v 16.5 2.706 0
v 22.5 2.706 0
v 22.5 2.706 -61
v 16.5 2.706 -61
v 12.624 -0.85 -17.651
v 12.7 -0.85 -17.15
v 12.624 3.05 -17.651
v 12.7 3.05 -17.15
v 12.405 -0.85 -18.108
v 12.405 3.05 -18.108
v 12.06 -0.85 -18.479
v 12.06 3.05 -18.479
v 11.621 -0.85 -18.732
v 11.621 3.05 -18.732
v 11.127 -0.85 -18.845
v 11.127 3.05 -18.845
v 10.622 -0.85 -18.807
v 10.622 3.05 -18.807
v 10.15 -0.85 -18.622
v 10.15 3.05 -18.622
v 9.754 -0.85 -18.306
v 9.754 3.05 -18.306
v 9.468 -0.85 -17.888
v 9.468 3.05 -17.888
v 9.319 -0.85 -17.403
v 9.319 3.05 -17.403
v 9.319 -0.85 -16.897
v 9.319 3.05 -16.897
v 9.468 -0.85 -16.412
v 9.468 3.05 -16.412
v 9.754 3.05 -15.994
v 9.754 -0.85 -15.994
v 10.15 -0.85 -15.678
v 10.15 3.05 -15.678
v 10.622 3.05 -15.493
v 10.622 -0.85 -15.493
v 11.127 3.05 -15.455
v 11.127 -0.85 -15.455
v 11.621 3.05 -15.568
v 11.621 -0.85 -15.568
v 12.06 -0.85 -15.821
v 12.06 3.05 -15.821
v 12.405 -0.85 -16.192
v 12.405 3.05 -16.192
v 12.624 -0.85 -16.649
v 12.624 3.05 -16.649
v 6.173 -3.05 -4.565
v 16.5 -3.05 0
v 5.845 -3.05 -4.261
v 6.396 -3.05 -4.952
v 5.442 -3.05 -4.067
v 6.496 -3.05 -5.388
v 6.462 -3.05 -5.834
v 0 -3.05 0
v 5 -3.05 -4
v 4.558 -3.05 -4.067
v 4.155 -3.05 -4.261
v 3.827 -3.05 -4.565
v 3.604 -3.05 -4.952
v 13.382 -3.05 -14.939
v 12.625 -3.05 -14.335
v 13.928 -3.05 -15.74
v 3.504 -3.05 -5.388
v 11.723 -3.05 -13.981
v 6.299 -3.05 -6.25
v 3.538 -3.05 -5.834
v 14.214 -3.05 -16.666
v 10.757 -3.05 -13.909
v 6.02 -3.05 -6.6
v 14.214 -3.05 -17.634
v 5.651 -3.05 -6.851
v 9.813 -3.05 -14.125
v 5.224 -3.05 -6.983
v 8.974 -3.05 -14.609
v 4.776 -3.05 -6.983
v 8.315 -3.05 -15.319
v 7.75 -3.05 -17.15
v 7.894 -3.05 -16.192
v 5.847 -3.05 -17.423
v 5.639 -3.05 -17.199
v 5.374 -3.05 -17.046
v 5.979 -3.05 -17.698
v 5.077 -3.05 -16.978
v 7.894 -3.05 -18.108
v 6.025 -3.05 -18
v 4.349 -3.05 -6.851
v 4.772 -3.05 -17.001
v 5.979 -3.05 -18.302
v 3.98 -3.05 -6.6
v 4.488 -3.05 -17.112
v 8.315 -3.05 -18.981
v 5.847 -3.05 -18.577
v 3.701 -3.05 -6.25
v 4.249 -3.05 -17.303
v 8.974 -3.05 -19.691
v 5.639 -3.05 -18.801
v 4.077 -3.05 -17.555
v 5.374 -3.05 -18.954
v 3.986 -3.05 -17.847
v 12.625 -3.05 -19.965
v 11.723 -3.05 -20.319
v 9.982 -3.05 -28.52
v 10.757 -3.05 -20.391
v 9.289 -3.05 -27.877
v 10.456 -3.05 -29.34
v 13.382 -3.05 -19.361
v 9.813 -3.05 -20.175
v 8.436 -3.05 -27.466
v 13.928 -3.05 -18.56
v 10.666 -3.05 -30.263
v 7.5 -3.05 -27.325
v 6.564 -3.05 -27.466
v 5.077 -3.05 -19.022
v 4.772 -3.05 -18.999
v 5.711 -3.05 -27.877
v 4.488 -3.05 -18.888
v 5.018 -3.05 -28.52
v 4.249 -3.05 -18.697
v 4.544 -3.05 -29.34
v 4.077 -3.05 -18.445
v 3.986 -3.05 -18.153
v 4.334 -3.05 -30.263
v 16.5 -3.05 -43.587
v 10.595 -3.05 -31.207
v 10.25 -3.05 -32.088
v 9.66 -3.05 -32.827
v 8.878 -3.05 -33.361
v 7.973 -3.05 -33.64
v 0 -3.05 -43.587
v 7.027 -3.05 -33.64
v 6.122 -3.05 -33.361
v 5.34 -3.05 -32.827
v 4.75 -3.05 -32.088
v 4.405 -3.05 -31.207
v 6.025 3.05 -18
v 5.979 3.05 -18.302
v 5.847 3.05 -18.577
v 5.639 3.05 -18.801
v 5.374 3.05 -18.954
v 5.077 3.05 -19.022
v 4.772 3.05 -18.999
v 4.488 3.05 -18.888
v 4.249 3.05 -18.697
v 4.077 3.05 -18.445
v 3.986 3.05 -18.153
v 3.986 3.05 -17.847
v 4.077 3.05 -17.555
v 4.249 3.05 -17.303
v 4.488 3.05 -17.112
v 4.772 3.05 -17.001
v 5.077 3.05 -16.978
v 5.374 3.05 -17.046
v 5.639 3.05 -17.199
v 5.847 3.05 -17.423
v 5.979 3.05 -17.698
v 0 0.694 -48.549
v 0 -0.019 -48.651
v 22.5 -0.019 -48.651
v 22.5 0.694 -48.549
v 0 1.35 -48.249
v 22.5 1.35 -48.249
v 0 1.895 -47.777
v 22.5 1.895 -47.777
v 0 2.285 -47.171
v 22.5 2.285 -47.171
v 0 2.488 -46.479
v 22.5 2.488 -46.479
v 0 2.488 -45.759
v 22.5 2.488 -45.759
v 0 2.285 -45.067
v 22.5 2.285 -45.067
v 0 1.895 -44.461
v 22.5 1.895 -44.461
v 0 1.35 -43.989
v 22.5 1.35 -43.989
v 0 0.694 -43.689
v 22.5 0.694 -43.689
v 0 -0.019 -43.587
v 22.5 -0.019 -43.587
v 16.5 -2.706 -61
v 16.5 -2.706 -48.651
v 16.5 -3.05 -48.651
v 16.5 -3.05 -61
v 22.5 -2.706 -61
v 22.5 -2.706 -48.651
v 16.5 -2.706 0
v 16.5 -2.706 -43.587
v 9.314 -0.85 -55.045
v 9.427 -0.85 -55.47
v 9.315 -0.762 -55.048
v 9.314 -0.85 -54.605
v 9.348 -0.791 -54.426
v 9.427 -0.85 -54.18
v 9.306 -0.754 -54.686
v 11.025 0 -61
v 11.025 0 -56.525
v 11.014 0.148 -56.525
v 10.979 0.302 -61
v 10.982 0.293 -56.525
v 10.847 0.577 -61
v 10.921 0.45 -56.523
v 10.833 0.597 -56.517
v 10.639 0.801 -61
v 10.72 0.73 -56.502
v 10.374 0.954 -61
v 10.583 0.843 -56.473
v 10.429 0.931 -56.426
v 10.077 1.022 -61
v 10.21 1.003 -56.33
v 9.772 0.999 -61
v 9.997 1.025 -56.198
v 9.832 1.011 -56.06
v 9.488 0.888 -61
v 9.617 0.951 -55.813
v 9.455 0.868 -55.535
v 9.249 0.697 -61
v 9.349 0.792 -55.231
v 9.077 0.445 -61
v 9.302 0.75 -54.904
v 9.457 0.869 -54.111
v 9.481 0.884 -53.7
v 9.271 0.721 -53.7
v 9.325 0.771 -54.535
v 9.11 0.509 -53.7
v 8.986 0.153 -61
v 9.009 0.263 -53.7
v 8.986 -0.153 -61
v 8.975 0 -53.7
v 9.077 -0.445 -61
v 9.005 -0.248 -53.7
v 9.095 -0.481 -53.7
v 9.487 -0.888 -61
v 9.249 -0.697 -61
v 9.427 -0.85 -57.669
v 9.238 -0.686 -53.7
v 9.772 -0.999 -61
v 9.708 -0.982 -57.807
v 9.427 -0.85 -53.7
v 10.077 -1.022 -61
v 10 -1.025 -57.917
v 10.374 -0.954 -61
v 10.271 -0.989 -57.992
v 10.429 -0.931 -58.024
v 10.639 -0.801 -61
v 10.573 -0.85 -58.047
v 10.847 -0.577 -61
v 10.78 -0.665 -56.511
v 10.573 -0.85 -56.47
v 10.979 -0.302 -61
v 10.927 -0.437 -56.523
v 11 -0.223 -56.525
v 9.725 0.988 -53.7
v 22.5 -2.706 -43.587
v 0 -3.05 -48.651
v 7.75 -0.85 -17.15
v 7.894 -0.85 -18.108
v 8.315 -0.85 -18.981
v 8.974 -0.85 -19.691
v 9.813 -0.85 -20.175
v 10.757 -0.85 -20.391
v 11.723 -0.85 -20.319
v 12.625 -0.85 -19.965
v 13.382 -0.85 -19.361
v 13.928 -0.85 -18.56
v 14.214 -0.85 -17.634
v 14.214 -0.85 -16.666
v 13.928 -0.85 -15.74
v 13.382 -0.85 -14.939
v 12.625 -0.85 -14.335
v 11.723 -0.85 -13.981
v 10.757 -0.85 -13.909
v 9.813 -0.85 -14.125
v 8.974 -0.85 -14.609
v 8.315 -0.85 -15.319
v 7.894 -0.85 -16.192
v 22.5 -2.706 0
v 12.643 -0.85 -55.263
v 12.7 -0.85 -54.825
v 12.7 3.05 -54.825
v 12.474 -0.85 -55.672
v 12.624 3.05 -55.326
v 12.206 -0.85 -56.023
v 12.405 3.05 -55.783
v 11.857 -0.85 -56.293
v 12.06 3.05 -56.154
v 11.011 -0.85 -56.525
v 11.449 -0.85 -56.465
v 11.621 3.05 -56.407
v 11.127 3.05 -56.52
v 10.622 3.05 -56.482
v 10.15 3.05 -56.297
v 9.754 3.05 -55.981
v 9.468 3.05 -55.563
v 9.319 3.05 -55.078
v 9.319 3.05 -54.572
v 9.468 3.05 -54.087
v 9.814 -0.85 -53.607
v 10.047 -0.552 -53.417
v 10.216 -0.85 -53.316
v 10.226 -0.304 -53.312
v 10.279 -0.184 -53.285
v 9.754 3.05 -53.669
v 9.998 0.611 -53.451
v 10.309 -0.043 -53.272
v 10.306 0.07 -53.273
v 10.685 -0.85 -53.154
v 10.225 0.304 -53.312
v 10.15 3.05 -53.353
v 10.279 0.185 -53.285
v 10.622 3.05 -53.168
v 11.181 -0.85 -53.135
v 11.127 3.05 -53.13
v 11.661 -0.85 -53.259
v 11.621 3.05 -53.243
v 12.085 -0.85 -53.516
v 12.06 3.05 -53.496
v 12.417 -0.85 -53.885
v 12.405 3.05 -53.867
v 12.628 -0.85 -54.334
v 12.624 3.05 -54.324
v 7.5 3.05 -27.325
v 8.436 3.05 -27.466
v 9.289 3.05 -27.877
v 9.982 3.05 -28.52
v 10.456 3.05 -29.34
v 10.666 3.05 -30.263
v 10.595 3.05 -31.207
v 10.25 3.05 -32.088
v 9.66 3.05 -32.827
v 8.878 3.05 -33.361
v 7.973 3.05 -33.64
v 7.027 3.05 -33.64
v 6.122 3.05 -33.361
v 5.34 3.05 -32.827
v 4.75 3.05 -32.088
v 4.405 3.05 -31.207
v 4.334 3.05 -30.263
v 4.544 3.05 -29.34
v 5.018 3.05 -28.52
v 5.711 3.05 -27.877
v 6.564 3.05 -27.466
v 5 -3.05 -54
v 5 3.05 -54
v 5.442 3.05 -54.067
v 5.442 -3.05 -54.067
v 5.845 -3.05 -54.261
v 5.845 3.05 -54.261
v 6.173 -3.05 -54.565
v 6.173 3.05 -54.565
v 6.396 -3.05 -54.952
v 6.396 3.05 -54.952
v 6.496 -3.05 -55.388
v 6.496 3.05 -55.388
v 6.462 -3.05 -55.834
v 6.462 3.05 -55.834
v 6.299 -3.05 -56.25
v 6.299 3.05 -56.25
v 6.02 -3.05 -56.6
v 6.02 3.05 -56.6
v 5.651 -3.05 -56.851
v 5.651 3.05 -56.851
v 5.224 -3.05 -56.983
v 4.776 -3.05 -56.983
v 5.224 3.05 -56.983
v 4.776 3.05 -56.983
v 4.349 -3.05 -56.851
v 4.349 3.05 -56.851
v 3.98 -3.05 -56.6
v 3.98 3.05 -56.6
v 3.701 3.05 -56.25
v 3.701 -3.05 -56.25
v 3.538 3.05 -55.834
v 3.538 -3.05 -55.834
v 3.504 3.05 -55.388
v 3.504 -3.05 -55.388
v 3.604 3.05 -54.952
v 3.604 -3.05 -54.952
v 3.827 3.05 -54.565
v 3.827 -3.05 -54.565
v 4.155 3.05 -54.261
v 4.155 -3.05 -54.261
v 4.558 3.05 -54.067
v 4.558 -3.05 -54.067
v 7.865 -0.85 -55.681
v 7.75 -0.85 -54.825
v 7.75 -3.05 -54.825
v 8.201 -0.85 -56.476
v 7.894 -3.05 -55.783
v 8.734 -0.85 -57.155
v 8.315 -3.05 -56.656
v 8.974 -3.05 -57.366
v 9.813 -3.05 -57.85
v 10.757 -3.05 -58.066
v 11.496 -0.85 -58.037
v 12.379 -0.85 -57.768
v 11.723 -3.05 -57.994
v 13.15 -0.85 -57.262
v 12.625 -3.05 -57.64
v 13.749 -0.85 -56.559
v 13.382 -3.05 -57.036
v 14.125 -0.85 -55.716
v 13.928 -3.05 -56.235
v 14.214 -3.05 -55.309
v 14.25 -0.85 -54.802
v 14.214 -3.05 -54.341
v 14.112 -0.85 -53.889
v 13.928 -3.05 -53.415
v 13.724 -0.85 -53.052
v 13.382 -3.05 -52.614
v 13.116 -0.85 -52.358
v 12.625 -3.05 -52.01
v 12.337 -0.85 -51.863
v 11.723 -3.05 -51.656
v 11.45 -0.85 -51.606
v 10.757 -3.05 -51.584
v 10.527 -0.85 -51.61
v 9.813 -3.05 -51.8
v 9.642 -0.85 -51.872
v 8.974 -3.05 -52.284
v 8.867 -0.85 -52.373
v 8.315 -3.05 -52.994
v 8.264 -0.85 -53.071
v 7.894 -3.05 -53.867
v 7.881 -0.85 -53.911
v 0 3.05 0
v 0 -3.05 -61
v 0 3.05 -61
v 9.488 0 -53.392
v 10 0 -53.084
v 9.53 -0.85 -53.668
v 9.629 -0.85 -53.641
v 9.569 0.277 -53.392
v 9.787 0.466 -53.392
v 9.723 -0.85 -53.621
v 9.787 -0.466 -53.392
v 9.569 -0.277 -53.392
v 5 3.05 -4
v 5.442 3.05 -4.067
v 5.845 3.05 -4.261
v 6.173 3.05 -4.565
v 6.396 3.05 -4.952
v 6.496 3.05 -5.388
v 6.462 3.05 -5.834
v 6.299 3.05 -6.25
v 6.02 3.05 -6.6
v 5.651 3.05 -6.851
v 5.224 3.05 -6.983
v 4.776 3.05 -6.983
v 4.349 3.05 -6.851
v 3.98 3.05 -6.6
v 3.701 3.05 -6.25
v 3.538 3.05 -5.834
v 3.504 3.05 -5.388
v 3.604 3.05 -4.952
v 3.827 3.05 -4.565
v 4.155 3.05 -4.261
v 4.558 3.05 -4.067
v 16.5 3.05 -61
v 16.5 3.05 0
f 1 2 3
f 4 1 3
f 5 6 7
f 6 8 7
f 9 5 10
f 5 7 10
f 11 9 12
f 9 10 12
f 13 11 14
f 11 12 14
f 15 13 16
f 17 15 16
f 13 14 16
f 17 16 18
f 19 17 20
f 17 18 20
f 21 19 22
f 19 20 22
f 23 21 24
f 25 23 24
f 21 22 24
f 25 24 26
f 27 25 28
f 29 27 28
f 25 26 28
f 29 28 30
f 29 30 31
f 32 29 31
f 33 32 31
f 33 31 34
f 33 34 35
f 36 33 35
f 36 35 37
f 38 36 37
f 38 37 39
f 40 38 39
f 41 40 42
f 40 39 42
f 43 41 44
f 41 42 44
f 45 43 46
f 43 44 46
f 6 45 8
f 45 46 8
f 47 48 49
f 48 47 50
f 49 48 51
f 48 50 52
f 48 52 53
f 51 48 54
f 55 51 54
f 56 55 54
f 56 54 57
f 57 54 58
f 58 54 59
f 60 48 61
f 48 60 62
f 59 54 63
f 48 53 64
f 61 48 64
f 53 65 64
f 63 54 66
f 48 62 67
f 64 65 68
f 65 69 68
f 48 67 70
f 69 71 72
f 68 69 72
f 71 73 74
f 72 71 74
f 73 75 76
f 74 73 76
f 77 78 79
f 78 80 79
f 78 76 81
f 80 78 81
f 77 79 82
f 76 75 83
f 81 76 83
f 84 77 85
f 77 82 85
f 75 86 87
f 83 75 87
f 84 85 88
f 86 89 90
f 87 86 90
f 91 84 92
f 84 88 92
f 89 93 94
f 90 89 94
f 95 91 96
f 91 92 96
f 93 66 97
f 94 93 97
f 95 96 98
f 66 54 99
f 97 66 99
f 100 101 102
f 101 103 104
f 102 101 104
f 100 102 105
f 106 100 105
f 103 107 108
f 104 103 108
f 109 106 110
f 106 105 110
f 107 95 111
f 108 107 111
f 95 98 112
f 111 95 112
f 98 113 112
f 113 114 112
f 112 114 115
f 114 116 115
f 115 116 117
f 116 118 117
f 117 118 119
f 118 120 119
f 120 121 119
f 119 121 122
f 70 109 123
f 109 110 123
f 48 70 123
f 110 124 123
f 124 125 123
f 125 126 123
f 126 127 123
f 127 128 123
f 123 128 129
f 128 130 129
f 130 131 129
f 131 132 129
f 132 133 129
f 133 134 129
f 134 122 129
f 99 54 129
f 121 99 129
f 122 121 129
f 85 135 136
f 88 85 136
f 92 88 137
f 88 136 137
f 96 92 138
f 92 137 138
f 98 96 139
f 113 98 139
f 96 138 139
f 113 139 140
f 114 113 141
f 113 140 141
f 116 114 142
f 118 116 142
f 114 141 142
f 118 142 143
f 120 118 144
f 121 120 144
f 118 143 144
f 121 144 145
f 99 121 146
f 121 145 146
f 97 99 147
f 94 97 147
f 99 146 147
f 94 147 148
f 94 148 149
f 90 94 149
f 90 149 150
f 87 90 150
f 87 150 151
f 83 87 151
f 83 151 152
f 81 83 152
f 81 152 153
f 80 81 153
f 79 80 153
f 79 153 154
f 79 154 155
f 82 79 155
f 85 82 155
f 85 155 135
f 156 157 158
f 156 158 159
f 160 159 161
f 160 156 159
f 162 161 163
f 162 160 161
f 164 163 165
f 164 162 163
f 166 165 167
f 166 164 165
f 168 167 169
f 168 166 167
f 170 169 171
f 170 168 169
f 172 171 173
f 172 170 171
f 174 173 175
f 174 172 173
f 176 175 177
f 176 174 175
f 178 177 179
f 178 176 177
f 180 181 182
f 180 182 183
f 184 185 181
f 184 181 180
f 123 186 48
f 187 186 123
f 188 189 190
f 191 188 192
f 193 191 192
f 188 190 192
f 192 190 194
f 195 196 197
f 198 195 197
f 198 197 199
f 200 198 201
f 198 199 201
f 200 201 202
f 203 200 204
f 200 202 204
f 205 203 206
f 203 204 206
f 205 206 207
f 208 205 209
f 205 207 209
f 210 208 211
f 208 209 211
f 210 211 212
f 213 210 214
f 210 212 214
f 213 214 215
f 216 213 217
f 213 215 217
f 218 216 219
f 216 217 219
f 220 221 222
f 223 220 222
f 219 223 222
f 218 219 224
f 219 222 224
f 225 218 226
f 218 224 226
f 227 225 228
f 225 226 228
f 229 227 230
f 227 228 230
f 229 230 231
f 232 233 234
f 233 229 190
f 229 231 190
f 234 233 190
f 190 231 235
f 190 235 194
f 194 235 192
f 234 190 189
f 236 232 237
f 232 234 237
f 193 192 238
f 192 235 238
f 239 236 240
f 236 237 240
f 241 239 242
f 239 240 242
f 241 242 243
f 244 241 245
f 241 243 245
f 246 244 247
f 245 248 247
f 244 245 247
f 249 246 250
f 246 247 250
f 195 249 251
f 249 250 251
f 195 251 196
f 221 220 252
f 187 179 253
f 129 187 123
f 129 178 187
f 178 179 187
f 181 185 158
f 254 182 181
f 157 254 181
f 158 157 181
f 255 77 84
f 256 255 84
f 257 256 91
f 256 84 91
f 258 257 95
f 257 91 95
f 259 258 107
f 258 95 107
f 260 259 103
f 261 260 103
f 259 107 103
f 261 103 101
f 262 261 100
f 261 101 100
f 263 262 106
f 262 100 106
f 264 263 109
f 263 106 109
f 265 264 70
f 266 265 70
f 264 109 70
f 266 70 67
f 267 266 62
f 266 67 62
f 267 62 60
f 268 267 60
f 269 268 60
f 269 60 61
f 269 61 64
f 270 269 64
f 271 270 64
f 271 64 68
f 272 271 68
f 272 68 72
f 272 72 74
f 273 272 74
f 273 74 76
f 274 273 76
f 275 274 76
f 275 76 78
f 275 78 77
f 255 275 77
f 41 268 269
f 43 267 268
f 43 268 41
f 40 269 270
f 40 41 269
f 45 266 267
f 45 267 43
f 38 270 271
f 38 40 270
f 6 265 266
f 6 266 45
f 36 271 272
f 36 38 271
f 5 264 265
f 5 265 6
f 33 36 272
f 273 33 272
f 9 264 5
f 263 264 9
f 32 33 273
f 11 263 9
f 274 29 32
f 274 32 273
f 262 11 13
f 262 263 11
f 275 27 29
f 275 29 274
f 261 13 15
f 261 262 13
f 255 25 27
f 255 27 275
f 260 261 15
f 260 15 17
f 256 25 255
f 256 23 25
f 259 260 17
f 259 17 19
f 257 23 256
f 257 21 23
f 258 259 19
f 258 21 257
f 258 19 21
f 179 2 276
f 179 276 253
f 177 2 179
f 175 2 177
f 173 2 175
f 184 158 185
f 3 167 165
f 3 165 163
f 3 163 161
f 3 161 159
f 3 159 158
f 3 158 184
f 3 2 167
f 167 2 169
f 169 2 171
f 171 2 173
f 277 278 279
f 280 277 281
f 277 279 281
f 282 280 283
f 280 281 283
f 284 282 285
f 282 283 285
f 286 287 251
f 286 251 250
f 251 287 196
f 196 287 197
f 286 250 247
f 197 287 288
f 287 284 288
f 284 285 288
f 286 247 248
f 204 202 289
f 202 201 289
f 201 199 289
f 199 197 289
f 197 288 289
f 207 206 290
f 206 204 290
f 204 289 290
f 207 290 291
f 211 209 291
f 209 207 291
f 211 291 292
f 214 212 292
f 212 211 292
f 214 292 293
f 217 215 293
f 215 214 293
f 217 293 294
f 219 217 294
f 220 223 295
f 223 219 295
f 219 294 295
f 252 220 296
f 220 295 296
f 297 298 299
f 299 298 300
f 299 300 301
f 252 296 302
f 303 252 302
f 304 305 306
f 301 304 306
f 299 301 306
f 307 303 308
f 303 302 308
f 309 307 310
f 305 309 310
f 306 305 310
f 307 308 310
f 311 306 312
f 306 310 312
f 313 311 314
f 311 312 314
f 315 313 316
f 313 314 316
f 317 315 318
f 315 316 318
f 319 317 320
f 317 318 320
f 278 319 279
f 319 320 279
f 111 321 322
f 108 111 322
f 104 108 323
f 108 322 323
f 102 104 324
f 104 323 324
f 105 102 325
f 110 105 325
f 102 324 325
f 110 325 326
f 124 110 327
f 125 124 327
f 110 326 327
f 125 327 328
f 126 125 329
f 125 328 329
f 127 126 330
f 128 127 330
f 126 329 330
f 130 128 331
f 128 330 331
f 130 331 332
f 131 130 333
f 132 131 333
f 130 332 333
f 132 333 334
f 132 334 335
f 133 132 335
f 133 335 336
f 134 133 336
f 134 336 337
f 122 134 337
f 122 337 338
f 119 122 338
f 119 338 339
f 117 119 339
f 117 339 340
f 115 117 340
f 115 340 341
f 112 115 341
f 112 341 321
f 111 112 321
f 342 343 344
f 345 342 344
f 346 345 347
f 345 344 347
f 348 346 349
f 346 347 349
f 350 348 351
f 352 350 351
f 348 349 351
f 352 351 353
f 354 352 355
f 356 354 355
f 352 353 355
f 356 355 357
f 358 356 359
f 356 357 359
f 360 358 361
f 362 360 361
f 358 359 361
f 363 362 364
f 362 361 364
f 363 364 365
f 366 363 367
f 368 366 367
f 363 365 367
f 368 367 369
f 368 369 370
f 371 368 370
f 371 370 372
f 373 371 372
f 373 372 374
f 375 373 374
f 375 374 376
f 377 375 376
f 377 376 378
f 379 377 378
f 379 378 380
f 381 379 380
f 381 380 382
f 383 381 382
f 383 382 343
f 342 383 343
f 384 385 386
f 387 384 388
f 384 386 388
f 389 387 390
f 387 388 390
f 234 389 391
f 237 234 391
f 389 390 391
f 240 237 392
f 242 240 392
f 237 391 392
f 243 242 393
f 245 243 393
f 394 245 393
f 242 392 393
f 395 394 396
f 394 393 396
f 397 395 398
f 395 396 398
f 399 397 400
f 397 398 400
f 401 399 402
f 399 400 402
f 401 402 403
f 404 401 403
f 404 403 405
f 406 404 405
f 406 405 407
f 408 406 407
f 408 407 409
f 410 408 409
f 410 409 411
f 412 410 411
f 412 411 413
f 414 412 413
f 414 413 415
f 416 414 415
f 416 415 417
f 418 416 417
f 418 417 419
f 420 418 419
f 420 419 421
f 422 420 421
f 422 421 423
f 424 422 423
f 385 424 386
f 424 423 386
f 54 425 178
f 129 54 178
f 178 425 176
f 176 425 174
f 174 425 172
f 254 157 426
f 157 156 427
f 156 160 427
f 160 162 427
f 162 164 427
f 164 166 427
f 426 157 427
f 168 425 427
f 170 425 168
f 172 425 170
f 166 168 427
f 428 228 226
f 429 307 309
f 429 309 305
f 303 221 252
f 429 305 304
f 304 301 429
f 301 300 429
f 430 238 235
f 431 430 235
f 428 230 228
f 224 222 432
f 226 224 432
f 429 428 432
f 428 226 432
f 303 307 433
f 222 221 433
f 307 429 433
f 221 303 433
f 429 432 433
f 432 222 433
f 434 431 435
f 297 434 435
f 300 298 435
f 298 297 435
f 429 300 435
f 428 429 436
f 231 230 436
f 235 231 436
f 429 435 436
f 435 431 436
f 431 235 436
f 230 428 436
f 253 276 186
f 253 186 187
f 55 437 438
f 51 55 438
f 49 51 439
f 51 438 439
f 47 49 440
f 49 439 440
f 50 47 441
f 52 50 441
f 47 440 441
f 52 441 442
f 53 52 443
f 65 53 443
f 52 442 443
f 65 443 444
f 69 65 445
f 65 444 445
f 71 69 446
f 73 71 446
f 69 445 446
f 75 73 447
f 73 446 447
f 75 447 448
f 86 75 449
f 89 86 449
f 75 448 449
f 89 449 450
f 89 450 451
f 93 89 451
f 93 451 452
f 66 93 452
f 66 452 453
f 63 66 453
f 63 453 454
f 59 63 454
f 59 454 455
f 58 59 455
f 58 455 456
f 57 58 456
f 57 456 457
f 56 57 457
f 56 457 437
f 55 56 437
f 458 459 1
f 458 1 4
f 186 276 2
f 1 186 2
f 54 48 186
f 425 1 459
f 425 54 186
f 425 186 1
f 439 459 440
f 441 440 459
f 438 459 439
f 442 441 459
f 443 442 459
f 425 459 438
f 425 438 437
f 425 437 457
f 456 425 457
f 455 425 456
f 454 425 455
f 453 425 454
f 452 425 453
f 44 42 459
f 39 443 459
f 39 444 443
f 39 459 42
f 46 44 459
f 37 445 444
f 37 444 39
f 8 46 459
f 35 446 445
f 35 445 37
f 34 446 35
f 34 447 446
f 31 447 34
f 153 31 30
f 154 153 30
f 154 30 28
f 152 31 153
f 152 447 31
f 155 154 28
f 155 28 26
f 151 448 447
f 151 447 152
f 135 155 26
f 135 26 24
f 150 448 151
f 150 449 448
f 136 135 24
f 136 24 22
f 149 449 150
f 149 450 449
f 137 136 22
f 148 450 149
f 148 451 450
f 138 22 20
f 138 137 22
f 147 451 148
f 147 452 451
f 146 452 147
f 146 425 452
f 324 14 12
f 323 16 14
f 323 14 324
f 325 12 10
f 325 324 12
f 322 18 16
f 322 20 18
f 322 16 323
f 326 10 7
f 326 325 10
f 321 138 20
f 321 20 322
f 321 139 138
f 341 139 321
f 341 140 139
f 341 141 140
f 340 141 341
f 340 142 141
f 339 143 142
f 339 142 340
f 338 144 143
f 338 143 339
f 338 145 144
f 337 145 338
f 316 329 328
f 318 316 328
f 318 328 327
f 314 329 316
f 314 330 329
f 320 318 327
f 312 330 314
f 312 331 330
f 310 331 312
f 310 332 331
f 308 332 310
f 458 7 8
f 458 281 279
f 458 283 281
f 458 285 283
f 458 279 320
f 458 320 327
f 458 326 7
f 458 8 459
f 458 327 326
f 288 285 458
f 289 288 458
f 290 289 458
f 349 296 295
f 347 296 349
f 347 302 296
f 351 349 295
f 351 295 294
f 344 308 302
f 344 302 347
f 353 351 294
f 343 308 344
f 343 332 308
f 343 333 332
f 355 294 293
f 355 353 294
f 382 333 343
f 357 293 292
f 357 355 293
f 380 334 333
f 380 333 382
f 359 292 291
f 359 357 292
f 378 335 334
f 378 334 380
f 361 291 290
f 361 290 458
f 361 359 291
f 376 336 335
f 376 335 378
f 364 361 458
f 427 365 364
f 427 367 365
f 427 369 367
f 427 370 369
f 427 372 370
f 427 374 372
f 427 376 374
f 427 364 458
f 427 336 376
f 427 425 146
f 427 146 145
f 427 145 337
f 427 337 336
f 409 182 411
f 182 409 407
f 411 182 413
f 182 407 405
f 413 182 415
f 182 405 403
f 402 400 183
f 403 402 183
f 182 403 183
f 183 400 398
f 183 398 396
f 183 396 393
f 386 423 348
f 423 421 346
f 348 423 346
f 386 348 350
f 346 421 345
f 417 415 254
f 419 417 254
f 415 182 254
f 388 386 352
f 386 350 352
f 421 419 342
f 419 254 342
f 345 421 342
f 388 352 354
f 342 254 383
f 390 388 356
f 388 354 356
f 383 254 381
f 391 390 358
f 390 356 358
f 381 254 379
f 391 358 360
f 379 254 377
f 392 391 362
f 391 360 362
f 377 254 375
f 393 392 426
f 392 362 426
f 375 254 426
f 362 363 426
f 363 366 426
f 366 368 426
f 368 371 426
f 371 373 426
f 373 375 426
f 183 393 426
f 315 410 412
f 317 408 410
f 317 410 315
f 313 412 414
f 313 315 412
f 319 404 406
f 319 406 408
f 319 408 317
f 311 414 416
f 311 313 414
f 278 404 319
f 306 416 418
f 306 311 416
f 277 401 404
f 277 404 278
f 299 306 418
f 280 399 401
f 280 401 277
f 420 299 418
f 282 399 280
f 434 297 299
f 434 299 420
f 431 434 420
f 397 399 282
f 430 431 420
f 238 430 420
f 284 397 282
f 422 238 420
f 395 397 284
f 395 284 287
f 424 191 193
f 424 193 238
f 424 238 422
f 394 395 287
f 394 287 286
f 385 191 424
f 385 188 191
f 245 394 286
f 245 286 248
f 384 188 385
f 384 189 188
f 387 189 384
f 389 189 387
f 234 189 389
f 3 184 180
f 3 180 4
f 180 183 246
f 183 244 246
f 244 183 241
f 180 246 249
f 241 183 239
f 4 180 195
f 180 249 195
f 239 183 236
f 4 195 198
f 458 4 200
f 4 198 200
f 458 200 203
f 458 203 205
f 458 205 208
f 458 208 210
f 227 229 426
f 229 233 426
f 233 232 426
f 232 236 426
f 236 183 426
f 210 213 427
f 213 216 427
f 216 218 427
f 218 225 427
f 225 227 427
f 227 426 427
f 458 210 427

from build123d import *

# Parameters (mm, degrees)
SKETCH1_W                                        = 61
SKETCH1_H                                        = 6.1
BOSS_EXTRUDE1_DEPTH                              = 22.5
SKETCH2_OUTSIDE_W                                = 76.06
SKETCH2_OUTSIDE_H                                = 21.16
SKETCH2_OUTSIDE_W_2                              = 61
SKETCH2_OUTSIDE_H_2                              = 5.41284
CUT_EXTRUDE1_DEPTH                               = 6
CUT_EXTRUDE3_DEPTH                               = 23.5
SKETCH6_R                                        = 3.175
CUT_EXTRUDE4_DEPTH                               = 7.1
SKETCH7_R                                        = 1.5
CUT_EXTRUDE5_DEPTH                               = 7.1
M2_5X0_45_TAPPED_HOLE1_D                         = 2.05
M2_5X0_45_TAPPED_HOLE2_D                         = 2.05
M2_5X0_45_TAPPED_HOLE2_DEPTH                     = 7.3
M2_5X0_45_TAPPED_HOLE2_TIP                       = 0.615882135
CBORE_FOR_M3_PAN_HEAD_MACHINE_SCREW1_D           = 3.4
CBORE_FOR_M3_PAN_HEAD_MACHINE_SCREW1_CBORE_D     = 6.5
CBORE_FOR_M3_PAN_HEAD_MACHINE_SCREW1_CBORE_DEPTH = 2.2


with BuildPart() as part:
    # Sketch1 → Boss-Extrude1 (new body)
    with BuildSketch(Plane(origin=(0, 0, 0), x_dir=(0, 0, -1), z_dir=(1, 0, 0))):
        with Locations((30.5, 0)):
            Rectangle(SKETCH1_W, SKETCH1_H)
    extrude(amount=BOSS_EXTRUDE1_DEPTH)

    # Sketch2 outside → Cut-Extrude1 (cut)
    with BuildSketch(Plane(origin=(22.5, 0, 0), x_dir=(0, 0, -1), z_dir=(1, 0, 0))):
        with Locations((30.5, 0)):
            Rectangle(SKETCH2_OUTSIDE_W, SKETCH2_OUTSIDE_H)
        with Locations((30.5, 0)):
            Rectangle(SKETCH2_OUTSIDE_W_2, SKETCH2_OUTSIDE_H_2, mode=Mode.SUBTRACT)
    extrude(amount=-CUT_EXTRUDE1_DEPTH, mode=Mode.SUBTRACT)

    # Sketch5 → Cut-Extrude3 (cut, through all)
    with BuildSketch(Plane.ZY):
        with BuildLine():
            Line((-43.5866, -0.01898), (-43.5866, -3.05))
            Line((-43.5866, -3.05), (-48.6514, -3.05))
            Line((-48.6514, -3.05), (-48.6514, -0.01898))
            ThreePointArc((-48.6514, -0.01898), (-46.119, 2.51342), (-43.5866, -0.01898))
        make_face()
    extrude(amount=-CUT_EXTRUDE3_DEPTH, mode=Mode.SUBTRACT)

    # Sketch6 → Cut-Extrude4 (cut, through all)
    with BuildSketch(Plane(origin=(0, 3.05, 0), x_dir=(1, 0, 0), z_dir=(0, 1, 0))):
        with Locations(Location((7.5, 30.5, 0), (0, 0, 270))):  # turned: the seam where the file's is
            Circle(SKETCH6_R)
    extrude(amount=-CUT_EXTRUDE4_DEPTH, mode=Mode.SUBTRACT)

    # Sketch7 → Cut-Extrude5 (cut, through all)
    with BuildSketch(Plane(origin=(0, 3.05, 0), x_dir=(1, 0, 0), z_dir=(0, 1, 0))):
        with Locations(Location((5, 55.5, 0), (0, 0, 270))):  # turned: the seam where the file's is
            Circle(SKETCH7_R)
        with Locations(Location((5, 5.5, 0), (0, 0, 270))):  # turned: the seam where the file's is
            Circle(SKETCH7_R)
    extrude(amount=-CUT_EXTRUDE5_DEPTH, mode=Mode.SUBTRACT)

    # M2.5x0.45 Tapped Hole1 (through all)
    with Locations(Plane(origin=(0, -3.05, 0), x_dir=(-1, 0, 0), z_dir=(0, -1, 0))):
        with Locations((-5, 18)):
            Hole(M2_5X0_45_TAPPED_HOLE1_D / 2)

    # M2.5x0.45 Tapped Hole2
    with Locations(Plane(origin=(0, 0, -61), x_dir=(-1, 0, 0), z_dir=(0, 0, -1))):
        with Locations((-10, 0)):
            Hole(M2_5X0_45_TAPPED_HOLE2_D / 2, depth=M2_5X0_45_TAPPED_HOLE2_DEPTH)
            with Locations((0, 0, -(M2_5X0_45_TAPPED_HOLE2_DEPTH + M2_5X0_45_TAPPED_HOLE2_TIP / 2))):  # 118° drill point
                Cone(0, M2_5X0_45_TAPPED_HOLE2_D / 2, M2_5X0_45_TAPPED_HOLE2_TIP, mode=Mode.SUBTRACT)

    # CBORE for M3 Pan Head Machine Screw1 (through all)
    with Locations(Plane(origin=(0, -3.05, 0), x_dir=(-1, 0, 0), z_dir=(0, -1, 0))):
        with Locations((-11, 54.825), (-11, 17.15)):
            CounterBoreHole(CBORE_FOR_M3_PAN_HEAD_MACHINE_SCREW1_D / 2, CBORE_FOR_M3_PAN_HEAD_MACHINE_SCREW1_CBORE_D / 2, CBORE_FOR_M3_PAN_HEAD_MACHINE_SCREW1_CBORE_DEPTH)


solid = part.part
